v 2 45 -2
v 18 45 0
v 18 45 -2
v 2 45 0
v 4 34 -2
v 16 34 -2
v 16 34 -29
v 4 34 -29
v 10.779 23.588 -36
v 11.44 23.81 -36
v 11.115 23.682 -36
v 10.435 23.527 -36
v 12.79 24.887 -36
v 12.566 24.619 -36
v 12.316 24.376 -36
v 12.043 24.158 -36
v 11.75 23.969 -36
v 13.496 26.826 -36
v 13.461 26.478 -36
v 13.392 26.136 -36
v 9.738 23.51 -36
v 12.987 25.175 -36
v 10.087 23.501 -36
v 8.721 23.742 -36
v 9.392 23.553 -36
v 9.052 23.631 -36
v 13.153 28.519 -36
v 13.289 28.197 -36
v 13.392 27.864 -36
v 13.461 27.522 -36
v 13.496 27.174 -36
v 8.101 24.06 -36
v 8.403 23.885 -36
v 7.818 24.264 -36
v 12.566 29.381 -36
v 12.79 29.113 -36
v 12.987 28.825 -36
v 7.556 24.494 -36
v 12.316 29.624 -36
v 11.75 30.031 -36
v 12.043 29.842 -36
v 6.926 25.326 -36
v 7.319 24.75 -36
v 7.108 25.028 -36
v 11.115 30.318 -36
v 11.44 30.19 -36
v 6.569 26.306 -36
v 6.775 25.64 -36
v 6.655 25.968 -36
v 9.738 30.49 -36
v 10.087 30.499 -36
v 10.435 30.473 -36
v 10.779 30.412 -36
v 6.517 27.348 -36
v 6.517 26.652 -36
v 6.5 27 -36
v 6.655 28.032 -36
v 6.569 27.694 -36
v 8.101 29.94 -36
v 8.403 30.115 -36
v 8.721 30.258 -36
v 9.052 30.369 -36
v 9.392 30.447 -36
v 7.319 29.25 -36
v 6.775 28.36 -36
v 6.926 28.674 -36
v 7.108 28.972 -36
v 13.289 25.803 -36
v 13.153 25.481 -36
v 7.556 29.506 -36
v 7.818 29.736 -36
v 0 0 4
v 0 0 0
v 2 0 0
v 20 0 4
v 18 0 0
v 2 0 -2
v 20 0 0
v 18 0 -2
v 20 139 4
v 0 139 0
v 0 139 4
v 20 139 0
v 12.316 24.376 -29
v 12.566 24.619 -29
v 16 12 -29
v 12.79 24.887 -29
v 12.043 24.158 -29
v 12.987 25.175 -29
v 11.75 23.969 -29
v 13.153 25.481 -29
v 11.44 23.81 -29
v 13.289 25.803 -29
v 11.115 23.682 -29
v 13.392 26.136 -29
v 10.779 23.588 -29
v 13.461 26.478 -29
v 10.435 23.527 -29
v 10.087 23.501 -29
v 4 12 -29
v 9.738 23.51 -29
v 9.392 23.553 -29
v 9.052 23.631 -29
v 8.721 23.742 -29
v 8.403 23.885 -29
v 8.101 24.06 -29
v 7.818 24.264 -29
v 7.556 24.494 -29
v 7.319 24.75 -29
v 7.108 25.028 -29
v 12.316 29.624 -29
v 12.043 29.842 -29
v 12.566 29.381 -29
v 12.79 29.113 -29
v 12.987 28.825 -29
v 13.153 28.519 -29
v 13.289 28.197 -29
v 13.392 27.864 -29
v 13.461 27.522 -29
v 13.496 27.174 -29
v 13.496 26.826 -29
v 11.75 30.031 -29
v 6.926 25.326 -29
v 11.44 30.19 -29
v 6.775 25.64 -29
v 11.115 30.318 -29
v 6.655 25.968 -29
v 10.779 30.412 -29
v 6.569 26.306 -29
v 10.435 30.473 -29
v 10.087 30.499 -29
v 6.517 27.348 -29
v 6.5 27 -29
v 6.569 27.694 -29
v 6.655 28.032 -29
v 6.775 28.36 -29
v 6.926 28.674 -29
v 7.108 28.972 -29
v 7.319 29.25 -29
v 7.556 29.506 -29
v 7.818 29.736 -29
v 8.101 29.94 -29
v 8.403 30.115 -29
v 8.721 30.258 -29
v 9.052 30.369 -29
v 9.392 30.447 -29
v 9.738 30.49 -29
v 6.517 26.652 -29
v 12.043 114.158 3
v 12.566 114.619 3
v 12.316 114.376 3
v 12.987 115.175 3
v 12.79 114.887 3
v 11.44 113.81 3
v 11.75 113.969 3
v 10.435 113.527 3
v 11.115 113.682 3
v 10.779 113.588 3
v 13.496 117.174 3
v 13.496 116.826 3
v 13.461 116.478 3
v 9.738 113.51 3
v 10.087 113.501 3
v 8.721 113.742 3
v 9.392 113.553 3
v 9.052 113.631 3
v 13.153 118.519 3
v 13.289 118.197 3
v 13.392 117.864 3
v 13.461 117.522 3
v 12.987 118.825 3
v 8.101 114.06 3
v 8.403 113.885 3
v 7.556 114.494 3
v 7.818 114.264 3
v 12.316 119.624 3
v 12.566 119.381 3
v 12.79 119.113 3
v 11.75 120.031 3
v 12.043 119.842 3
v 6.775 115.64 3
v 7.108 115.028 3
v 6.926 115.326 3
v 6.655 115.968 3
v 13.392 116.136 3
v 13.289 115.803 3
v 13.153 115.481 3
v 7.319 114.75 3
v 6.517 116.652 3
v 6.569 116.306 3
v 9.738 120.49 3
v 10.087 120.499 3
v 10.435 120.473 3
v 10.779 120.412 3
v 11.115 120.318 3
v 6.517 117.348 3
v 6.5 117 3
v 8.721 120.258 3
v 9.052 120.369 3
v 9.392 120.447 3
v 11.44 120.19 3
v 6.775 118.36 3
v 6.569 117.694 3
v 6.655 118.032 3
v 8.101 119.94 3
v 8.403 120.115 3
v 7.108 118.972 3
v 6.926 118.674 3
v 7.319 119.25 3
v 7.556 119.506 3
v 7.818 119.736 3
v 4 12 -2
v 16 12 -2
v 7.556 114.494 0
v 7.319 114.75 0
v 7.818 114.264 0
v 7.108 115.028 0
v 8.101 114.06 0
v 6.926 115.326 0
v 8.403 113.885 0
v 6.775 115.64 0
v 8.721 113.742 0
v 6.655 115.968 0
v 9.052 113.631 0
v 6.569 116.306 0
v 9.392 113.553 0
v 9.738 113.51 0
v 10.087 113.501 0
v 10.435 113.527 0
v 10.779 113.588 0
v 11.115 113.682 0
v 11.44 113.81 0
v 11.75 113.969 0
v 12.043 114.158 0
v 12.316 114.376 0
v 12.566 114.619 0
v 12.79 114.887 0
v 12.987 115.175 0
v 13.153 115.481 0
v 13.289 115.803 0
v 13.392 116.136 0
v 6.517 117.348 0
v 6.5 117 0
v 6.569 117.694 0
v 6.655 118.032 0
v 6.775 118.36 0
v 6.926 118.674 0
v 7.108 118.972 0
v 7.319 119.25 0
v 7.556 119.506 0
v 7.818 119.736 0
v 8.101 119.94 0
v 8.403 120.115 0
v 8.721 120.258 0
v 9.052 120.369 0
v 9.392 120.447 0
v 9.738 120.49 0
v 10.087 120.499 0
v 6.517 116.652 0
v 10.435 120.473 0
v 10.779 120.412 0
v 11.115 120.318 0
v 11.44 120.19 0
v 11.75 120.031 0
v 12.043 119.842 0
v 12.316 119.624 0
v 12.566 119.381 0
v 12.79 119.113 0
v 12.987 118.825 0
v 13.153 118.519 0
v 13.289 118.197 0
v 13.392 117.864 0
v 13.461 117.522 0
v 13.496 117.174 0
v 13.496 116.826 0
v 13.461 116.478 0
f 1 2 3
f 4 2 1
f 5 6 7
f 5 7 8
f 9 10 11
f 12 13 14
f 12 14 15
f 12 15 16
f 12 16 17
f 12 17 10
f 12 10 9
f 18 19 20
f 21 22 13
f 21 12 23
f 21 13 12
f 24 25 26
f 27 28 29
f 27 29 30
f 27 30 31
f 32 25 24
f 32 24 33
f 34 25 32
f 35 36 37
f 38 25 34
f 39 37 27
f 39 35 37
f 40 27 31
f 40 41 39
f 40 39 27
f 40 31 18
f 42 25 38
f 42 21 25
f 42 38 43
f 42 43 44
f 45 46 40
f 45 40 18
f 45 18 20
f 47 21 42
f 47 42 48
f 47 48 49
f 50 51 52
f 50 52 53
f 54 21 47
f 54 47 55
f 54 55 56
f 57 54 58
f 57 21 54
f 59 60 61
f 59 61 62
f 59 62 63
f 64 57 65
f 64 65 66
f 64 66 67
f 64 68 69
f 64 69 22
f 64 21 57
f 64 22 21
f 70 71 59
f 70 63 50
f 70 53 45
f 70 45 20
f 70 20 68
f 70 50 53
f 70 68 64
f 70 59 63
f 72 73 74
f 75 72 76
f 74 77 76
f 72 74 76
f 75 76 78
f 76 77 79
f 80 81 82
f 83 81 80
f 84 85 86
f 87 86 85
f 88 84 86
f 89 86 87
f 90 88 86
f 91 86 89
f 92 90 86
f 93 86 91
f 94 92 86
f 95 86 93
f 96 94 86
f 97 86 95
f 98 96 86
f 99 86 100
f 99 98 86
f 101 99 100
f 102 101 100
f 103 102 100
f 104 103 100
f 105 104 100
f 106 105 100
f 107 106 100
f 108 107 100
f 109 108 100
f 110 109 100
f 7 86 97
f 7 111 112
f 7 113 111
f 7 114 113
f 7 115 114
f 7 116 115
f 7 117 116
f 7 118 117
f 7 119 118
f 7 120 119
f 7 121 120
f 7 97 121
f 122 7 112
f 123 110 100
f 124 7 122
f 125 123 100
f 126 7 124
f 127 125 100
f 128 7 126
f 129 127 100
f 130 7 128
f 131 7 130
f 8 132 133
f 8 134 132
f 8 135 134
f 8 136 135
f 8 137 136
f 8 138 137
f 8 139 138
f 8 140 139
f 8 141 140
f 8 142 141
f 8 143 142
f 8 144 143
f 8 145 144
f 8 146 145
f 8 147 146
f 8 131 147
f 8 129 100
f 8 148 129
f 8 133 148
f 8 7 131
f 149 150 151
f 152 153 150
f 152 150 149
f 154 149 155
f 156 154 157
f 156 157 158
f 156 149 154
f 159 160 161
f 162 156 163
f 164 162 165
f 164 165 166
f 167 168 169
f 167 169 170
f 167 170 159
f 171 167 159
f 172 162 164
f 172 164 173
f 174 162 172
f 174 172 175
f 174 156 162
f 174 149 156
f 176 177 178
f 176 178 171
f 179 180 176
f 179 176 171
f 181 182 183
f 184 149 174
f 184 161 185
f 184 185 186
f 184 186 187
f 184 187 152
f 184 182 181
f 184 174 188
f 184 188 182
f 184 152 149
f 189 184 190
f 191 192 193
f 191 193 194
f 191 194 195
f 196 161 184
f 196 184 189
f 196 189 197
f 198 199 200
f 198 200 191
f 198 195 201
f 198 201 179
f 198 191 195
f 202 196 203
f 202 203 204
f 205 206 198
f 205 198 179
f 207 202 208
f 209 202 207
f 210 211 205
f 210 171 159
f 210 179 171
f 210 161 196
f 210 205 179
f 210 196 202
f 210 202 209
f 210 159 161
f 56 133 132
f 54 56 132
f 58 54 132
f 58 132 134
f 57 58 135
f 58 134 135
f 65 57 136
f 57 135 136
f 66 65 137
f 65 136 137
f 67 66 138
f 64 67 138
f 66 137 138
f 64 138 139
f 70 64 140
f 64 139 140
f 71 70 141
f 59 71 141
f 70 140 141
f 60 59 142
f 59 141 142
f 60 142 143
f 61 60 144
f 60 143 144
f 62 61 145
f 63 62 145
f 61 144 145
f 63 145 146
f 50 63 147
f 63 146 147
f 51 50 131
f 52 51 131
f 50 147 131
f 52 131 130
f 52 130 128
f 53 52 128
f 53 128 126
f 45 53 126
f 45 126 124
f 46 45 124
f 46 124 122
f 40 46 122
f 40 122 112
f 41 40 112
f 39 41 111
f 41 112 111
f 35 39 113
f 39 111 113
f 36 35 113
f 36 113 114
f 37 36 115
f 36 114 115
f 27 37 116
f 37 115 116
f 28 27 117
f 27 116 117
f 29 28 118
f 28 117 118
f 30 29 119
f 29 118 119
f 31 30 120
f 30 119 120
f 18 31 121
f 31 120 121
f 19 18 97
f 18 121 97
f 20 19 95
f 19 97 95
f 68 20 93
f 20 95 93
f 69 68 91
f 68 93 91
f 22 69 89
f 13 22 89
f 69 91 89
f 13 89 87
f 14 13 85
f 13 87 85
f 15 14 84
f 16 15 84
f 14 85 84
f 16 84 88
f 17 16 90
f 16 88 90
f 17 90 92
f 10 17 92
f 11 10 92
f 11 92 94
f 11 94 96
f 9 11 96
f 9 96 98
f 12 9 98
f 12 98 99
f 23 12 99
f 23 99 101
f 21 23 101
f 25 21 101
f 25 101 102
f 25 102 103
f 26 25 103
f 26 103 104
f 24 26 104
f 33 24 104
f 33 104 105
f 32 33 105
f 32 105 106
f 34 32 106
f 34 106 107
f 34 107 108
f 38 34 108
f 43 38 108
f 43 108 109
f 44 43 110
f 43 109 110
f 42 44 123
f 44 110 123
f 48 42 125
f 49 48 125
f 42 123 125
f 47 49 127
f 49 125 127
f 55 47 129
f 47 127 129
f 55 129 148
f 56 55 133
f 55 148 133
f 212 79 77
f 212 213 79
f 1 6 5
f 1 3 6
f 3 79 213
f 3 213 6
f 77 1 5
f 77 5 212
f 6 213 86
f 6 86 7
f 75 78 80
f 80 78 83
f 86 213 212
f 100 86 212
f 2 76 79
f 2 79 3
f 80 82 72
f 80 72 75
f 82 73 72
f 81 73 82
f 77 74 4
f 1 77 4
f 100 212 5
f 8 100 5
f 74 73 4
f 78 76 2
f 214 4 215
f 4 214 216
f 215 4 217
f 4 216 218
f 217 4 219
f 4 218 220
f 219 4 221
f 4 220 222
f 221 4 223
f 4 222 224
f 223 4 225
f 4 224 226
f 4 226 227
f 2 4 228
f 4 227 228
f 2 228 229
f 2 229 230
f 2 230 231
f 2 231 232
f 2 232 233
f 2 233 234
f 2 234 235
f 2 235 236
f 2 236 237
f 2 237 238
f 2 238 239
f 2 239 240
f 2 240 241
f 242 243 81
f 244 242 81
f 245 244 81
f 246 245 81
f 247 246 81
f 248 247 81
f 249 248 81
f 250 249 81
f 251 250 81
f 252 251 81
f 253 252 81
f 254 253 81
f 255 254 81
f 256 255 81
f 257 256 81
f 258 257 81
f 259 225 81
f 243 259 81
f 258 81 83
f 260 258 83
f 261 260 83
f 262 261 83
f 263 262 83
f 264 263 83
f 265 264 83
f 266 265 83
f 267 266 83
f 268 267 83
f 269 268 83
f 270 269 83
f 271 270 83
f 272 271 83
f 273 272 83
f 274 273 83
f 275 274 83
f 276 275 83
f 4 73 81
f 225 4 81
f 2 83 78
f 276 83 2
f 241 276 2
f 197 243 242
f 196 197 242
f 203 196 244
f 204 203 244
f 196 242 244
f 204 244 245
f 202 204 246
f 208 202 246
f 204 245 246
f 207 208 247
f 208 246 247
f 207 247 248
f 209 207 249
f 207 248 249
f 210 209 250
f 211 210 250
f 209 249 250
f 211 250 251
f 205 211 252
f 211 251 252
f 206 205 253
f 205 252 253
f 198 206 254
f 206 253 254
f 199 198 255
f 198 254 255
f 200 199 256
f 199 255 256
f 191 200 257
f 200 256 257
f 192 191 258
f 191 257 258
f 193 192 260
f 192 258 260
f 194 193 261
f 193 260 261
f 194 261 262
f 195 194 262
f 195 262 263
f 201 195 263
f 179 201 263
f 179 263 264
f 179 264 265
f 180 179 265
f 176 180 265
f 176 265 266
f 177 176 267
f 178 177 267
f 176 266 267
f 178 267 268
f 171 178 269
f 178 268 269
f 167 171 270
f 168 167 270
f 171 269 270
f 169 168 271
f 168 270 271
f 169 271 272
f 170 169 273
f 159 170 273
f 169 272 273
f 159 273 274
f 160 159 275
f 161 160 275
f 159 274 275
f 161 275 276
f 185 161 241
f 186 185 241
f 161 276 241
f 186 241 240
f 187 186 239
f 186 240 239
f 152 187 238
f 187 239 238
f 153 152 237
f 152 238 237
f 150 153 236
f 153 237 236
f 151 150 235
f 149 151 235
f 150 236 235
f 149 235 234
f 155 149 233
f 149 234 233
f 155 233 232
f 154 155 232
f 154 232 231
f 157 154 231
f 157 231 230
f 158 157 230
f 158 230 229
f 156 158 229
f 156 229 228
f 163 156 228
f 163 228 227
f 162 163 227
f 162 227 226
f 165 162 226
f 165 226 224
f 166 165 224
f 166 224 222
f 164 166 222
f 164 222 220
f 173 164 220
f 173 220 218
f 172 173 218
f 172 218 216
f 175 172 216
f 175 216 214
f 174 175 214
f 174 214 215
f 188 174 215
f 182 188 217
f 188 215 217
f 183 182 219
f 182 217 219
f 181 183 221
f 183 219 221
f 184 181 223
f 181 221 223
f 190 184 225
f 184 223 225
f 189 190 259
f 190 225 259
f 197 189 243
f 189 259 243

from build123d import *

# Parameters (mm, degrees)
SKIZZE1_W                       = 20
SKIZZE1_H                       = 139
AUFSATZ_LINEAR_AUSTRAGEN1_DEPTH = 4
SKIZZE7_R                       = 3.5
SCHNITT_LINEAR_AUSTRAGEN1_DEPTH = 3
SKIZZE8_W                       = 16
SKIZZE8_H                       = 45
AUFSATZ_LINEAR_AUSTRAGEN5_DEPTH = 2
SKIZZE9_W                       = 12
SKIZZE9_H                       = 22
AUFSATZ_LINEAR_AUSTRAGEN6_DEPTH = 27
SKIZZE10_R                      = 3.5
AUFSATZ_LINEAR_AUSTRAGEN7_DEPTH = 7


with BuildPart() as part:
    # Skizze1 → Aufsatz-Linear austragen1 (new body)
    with BuildSketch(Plane.XY):
        with Locations((10, 69.5)):
            Rectangle(SKIZZE1_W, SKIZZE1_H)
    extrude(amount=AUFSATZ_LINEAR_AUSTRAGEN1_DEPTH)

    # Skizze7 → Schnitt-Linear austragen1 (cut)
    with BuildSketch(Plane(origin=(0, 0, 0), x_dir=(-1, 0, 0), z_dir=(0, 0, -1))):
        with Locations((-10, 117)):
            Circle(SKIZZE7_R)
    extrude(amount=-SCHNITT_LINEAR_AUSTRAGEN1_DEPTH, mode=Mode.SUBTRACT)

    # Skizze8 → Aufsatz-Linear austragen5 (add)
    with BuildSketch(Plane(origin=(0, 0, 0), x_dir=(-1, 0, 0), z_dir=(0, 0, -1))):
        with Locations((-10, 22.5)):
            Rectangle(SKIZZE8_W, SKIZZE8_H)
    extrude(amount=AUFSATZ_LINEAR_AUSTRAGEN5_DEPTH)

    # Skizze9 → Aufsatz-Linear austragen6 (add)
    with BuildSketch(Plane(origin=(0, 0, -2), x_dir=(-1, 0, 0), z_dir=(0, 0, -1))):
        with Locations((-10, 23)):
            Rectangle(SKIZZE9_W, SKIZZE9_H)
    extrude(amount=AUFSATZ_LINEAR_AUSTRAGEN6_DEPTH)

    # Skizze10 → Aufsatz-Linear austragen7 (add)
    with BuildSketch(Plane(origin=(0, 0, -29), x_dir=(-1, 0, 0), z_dir=(0, 0, -1))):
        with Locations((-10, 27)):
            Circle(SKIZZE10_R)
    extrude(amount=AUFSATZ_LINEAR_AUSTRAGEN7_DEPTH)


solid = part.part
